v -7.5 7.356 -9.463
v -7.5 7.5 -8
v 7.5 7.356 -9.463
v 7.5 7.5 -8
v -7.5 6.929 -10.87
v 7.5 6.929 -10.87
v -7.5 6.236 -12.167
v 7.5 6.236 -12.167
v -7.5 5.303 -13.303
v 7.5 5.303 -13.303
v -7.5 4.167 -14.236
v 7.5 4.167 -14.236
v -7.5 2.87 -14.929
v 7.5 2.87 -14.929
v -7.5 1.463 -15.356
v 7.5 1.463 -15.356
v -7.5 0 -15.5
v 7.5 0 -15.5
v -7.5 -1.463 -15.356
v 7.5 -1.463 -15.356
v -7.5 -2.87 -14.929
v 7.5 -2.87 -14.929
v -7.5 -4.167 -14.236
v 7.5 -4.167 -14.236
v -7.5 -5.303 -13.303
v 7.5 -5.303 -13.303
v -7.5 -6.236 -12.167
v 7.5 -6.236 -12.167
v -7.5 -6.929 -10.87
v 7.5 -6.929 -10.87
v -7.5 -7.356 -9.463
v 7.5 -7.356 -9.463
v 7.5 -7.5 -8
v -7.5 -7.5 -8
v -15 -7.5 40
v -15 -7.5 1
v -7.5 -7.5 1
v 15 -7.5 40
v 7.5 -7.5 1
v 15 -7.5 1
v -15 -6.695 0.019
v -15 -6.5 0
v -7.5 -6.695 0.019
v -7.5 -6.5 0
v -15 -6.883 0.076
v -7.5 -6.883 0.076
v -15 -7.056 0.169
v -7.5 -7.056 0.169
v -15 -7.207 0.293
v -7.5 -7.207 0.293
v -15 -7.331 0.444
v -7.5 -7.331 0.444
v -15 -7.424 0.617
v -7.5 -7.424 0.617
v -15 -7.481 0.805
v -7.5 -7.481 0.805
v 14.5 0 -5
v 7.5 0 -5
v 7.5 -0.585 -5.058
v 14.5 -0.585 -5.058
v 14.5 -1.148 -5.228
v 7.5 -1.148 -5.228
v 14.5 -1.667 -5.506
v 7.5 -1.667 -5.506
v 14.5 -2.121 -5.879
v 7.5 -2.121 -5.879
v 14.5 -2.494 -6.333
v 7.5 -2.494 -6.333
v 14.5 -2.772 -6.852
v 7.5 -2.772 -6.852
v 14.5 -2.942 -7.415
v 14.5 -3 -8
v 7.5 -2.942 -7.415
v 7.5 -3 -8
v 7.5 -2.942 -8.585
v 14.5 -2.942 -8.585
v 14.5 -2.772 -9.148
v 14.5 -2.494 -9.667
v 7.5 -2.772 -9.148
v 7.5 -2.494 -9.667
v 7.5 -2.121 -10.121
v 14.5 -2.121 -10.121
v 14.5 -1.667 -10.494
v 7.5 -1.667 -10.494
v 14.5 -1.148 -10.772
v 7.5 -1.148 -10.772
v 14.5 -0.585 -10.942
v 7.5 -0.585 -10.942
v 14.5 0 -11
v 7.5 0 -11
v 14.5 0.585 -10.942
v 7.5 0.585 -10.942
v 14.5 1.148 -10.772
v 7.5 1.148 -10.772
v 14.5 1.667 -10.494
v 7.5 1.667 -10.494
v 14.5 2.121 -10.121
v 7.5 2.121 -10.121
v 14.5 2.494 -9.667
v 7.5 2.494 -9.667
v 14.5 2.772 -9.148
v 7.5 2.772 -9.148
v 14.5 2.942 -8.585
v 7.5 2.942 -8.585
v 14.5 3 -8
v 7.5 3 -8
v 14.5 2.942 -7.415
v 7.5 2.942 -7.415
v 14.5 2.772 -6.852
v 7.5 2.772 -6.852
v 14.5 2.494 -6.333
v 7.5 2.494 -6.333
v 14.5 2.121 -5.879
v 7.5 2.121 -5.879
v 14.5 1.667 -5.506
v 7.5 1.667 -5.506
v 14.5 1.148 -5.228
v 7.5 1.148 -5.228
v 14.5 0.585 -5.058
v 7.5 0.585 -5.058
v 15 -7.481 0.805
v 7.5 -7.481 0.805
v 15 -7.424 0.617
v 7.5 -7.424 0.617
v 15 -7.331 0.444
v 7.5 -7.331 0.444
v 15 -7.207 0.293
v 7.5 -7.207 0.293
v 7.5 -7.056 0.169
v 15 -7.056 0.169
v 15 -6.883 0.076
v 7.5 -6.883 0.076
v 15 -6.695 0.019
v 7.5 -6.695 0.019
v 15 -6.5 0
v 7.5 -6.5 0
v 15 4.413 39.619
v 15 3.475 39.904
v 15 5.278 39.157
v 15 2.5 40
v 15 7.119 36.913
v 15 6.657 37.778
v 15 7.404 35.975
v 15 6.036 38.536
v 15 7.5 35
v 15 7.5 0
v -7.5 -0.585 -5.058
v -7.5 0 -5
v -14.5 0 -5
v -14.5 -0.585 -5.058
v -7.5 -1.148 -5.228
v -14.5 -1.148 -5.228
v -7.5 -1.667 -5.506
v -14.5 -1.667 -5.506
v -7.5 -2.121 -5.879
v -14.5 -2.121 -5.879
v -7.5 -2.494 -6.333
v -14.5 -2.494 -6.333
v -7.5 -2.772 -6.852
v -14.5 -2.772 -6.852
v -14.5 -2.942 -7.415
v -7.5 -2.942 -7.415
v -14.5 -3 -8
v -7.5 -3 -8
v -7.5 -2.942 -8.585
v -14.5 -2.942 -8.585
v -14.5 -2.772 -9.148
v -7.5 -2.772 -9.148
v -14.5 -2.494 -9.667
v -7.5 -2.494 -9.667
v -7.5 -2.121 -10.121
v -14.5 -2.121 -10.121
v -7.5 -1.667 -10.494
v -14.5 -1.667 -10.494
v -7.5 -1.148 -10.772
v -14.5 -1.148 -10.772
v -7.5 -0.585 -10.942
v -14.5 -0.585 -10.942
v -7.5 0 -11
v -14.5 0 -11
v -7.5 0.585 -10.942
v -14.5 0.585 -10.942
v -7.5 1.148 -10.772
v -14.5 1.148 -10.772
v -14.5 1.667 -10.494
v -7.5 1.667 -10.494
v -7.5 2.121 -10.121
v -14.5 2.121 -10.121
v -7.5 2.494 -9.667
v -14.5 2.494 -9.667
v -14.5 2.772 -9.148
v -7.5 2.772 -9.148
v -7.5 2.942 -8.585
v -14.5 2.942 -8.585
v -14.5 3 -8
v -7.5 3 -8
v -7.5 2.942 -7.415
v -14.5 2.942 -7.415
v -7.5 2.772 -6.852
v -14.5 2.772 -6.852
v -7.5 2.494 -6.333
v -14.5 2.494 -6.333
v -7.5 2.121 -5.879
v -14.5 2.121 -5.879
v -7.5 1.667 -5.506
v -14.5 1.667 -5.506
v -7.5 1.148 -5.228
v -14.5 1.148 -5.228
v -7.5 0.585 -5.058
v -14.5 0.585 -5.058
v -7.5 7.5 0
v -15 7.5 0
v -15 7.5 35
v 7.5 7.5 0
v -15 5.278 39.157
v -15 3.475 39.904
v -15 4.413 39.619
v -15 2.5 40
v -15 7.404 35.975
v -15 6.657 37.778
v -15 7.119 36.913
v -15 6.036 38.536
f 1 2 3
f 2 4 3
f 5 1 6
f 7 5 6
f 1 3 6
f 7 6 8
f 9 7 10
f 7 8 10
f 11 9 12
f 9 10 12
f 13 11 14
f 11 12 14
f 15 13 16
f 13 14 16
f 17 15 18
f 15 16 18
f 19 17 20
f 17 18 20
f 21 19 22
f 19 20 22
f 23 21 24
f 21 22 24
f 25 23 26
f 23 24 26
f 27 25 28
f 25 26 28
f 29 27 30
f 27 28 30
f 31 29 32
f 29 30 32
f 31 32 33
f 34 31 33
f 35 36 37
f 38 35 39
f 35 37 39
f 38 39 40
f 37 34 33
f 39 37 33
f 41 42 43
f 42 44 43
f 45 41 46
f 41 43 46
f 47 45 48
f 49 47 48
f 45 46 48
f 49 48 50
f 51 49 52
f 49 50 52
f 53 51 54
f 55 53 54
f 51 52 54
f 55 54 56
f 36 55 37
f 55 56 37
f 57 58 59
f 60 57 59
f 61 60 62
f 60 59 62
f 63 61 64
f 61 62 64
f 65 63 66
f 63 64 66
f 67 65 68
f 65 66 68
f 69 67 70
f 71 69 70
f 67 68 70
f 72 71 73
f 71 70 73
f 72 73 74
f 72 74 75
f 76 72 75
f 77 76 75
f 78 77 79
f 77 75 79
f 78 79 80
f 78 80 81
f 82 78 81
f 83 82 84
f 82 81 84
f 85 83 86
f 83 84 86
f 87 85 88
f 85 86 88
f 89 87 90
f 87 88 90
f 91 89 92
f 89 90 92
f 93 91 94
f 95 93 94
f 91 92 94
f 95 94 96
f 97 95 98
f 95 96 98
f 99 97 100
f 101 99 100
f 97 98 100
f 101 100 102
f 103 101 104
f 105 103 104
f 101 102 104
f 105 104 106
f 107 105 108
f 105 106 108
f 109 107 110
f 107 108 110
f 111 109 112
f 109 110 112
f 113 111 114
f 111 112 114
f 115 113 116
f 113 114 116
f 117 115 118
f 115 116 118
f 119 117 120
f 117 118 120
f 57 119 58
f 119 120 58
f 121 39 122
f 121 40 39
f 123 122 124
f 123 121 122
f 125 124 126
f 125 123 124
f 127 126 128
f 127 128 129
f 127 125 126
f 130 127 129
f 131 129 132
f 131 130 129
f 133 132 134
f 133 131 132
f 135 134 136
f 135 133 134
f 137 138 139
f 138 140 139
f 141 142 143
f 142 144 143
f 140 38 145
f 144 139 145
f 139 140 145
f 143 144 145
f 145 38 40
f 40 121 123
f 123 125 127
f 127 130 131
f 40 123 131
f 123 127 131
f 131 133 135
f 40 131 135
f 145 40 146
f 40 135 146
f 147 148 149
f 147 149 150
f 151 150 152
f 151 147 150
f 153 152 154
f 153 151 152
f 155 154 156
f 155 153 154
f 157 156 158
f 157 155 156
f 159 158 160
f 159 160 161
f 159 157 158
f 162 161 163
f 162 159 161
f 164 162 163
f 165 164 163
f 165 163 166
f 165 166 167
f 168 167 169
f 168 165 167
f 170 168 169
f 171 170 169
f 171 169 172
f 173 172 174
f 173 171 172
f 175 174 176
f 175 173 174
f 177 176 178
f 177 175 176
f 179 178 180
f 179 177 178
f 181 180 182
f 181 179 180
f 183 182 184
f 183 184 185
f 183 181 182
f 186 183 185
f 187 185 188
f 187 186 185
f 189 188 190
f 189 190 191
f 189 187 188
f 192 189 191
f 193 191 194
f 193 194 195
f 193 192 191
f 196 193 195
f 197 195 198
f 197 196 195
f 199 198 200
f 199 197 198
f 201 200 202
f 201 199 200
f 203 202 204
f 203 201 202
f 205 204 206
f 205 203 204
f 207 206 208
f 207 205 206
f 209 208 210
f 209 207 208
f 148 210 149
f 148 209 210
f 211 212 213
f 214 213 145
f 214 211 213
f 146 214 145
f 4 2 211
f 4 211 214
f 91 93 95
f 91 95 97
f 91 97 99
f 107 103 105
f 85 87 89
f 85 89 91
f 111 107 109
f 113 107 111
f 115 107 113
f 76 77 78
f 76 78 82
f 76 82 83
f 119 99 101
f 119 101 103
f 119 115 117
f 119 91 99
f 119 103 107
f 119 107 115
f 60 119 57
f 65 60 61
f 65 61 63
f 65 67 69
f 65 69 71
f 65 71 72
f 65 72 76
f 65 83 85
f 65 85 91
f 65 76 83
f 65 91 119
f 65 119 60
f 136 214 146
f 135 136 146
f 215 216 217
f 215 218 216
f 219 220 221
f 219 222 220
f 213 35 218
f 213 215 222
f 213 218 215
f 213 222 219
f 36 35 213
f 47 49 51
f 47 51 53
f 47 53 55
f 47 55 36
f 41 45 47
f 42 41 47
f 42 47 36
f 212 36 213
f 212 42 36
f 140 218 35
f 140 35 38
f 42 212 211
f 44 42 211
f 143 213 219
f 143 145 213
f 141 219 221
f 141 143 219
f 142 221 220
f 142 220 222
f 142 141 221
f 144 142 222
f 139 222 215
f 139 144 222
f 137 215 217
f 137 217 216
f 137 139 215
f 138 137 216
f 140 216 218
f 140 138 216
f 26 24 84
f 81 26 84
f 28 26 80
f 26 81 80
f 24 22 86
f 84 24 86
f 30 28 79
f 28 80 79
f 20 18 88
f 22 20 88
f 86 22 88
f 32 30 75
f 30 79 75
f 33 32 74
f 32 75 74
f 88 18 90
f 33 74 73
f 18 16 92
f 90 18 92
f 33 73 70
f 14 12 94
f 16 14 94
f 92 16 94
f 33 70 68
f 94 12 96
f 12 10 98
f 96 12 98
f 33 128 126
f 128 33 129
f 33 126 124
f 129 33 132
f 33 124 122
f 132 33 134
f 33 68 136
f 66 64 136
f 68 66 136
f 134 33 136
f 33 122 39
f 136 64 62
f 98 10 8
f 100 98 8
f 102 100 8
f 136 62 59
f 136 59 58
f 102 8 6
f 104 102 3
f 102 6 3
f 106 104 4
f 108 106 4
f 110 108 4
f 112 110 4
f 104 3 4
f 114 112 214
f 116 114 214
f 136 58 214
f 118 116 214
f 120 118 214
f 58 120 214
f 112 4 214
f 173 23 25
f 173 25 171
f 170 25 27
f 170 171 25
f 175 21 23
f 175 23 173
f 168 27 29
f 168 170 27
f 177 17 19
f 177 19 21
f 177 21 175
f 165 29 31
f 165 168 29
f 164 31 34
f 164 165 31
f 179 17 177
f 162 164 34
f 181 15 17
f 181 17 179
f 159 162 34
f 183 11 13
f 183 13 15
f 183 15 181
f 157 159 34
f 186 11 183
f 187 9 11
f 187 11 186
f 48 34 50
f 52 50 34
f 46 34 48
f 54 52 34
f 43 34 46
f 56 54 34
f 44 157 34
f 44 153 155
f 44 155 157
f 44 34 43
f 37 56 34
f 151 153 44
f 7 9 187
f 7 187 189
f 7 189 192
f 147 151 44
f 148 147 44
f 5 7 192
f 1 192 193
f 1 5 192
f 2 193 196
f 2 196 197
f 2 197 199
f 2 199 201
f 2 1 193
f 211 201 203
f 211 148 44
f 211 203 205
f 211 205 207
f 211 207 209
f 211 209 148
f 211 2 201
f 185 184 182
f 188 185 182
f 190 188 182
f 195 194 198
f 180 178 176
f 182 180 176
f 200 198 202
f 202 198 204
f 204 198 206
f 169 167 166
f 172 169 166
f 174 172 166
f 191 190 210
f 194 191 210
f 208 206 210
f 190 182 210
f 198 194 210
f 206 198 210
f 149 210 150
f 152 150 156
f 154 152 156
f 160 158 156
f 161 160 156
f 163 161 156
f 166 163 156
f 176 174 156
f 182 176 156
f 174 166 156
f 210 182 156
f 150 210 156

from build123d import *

# Parameters (mm, degrees)
SKETCH_1_W      = 30
SKETCH_1_H      = 15
EXTRUDE_1_DEPTH = 40
EXTRUDE_3_DEPTH = 7.5
SKETCH_7_R      = 3
EXTRUDE_4_DEPTH = 7
FILLET_1_R      = 5
FILLET_2_R      = 1


with BuildPart() as part:
    # 草图1 → 凸台-拉伸1 (new body)
    with BuildSketch(Plane.XY):
        Rectangle(SKETCH_1_W, SKETCH_1_H)
    extrude(amount=EXTRUDE_1_DEPTH)

    # 草图6 → 凸台-拉伸3 (add, symmetric)
    with BuildSketch(Plane(origin=(0, 0, 0), x_dir=(0, 0, -1), z_dir=(1, 0, 0))):
        with BuildLine():
            Line((0, 7.5), (8, 7.5))
            ThreePointArc((8, 7.5), (15.5, 0), (8, -7.5))
            Line((8, -7.5), (0, -7.5))
            Line((0, -7.5), (0, 7.5))
        make_face()
    extrude(amount=EXTRUDE_3_DEPTH, both=True)

    # 草图7 → 凸台-拉伸4 (add)
    with BuildSketch(Plane(origin=(7.5, 0, 0), x_dir=(0, 0, -1), z_dir=(1, 0, 0))):
        with Locations(Location((8, 0, 0), (0, 0, 180))):
            Circle(SKETCH_7_R)
    extrude_4 = extrude(amount=EXTRUDE_4_DEPTH)

    # 镜向2: 凸台-拉伸4 across plane
    add(extrude_4.mirror(Plane(origin=(0, 0, 0), x_dir=(0, 0, 1), z_dir=(1, 0, 0))))

    # 圆角1
    fillet_1_edges = [part.edges().sort_by_distance(p)[0] for p in [
        (0, 7.5, 40),
    ]]
    fillet(fillet_1_edges, radius=FILLET_1_R)

    # 圆角2
    fillet_2_edges = [part.edges().sort_by_distance(p)[0] for p in [
        (11.25, -7.5, 0),
        (-11.25, -7.5, 0),
    ]]
    fillet(fillet_2_edges, radius=FILLET_2_R)


solid = part.part
